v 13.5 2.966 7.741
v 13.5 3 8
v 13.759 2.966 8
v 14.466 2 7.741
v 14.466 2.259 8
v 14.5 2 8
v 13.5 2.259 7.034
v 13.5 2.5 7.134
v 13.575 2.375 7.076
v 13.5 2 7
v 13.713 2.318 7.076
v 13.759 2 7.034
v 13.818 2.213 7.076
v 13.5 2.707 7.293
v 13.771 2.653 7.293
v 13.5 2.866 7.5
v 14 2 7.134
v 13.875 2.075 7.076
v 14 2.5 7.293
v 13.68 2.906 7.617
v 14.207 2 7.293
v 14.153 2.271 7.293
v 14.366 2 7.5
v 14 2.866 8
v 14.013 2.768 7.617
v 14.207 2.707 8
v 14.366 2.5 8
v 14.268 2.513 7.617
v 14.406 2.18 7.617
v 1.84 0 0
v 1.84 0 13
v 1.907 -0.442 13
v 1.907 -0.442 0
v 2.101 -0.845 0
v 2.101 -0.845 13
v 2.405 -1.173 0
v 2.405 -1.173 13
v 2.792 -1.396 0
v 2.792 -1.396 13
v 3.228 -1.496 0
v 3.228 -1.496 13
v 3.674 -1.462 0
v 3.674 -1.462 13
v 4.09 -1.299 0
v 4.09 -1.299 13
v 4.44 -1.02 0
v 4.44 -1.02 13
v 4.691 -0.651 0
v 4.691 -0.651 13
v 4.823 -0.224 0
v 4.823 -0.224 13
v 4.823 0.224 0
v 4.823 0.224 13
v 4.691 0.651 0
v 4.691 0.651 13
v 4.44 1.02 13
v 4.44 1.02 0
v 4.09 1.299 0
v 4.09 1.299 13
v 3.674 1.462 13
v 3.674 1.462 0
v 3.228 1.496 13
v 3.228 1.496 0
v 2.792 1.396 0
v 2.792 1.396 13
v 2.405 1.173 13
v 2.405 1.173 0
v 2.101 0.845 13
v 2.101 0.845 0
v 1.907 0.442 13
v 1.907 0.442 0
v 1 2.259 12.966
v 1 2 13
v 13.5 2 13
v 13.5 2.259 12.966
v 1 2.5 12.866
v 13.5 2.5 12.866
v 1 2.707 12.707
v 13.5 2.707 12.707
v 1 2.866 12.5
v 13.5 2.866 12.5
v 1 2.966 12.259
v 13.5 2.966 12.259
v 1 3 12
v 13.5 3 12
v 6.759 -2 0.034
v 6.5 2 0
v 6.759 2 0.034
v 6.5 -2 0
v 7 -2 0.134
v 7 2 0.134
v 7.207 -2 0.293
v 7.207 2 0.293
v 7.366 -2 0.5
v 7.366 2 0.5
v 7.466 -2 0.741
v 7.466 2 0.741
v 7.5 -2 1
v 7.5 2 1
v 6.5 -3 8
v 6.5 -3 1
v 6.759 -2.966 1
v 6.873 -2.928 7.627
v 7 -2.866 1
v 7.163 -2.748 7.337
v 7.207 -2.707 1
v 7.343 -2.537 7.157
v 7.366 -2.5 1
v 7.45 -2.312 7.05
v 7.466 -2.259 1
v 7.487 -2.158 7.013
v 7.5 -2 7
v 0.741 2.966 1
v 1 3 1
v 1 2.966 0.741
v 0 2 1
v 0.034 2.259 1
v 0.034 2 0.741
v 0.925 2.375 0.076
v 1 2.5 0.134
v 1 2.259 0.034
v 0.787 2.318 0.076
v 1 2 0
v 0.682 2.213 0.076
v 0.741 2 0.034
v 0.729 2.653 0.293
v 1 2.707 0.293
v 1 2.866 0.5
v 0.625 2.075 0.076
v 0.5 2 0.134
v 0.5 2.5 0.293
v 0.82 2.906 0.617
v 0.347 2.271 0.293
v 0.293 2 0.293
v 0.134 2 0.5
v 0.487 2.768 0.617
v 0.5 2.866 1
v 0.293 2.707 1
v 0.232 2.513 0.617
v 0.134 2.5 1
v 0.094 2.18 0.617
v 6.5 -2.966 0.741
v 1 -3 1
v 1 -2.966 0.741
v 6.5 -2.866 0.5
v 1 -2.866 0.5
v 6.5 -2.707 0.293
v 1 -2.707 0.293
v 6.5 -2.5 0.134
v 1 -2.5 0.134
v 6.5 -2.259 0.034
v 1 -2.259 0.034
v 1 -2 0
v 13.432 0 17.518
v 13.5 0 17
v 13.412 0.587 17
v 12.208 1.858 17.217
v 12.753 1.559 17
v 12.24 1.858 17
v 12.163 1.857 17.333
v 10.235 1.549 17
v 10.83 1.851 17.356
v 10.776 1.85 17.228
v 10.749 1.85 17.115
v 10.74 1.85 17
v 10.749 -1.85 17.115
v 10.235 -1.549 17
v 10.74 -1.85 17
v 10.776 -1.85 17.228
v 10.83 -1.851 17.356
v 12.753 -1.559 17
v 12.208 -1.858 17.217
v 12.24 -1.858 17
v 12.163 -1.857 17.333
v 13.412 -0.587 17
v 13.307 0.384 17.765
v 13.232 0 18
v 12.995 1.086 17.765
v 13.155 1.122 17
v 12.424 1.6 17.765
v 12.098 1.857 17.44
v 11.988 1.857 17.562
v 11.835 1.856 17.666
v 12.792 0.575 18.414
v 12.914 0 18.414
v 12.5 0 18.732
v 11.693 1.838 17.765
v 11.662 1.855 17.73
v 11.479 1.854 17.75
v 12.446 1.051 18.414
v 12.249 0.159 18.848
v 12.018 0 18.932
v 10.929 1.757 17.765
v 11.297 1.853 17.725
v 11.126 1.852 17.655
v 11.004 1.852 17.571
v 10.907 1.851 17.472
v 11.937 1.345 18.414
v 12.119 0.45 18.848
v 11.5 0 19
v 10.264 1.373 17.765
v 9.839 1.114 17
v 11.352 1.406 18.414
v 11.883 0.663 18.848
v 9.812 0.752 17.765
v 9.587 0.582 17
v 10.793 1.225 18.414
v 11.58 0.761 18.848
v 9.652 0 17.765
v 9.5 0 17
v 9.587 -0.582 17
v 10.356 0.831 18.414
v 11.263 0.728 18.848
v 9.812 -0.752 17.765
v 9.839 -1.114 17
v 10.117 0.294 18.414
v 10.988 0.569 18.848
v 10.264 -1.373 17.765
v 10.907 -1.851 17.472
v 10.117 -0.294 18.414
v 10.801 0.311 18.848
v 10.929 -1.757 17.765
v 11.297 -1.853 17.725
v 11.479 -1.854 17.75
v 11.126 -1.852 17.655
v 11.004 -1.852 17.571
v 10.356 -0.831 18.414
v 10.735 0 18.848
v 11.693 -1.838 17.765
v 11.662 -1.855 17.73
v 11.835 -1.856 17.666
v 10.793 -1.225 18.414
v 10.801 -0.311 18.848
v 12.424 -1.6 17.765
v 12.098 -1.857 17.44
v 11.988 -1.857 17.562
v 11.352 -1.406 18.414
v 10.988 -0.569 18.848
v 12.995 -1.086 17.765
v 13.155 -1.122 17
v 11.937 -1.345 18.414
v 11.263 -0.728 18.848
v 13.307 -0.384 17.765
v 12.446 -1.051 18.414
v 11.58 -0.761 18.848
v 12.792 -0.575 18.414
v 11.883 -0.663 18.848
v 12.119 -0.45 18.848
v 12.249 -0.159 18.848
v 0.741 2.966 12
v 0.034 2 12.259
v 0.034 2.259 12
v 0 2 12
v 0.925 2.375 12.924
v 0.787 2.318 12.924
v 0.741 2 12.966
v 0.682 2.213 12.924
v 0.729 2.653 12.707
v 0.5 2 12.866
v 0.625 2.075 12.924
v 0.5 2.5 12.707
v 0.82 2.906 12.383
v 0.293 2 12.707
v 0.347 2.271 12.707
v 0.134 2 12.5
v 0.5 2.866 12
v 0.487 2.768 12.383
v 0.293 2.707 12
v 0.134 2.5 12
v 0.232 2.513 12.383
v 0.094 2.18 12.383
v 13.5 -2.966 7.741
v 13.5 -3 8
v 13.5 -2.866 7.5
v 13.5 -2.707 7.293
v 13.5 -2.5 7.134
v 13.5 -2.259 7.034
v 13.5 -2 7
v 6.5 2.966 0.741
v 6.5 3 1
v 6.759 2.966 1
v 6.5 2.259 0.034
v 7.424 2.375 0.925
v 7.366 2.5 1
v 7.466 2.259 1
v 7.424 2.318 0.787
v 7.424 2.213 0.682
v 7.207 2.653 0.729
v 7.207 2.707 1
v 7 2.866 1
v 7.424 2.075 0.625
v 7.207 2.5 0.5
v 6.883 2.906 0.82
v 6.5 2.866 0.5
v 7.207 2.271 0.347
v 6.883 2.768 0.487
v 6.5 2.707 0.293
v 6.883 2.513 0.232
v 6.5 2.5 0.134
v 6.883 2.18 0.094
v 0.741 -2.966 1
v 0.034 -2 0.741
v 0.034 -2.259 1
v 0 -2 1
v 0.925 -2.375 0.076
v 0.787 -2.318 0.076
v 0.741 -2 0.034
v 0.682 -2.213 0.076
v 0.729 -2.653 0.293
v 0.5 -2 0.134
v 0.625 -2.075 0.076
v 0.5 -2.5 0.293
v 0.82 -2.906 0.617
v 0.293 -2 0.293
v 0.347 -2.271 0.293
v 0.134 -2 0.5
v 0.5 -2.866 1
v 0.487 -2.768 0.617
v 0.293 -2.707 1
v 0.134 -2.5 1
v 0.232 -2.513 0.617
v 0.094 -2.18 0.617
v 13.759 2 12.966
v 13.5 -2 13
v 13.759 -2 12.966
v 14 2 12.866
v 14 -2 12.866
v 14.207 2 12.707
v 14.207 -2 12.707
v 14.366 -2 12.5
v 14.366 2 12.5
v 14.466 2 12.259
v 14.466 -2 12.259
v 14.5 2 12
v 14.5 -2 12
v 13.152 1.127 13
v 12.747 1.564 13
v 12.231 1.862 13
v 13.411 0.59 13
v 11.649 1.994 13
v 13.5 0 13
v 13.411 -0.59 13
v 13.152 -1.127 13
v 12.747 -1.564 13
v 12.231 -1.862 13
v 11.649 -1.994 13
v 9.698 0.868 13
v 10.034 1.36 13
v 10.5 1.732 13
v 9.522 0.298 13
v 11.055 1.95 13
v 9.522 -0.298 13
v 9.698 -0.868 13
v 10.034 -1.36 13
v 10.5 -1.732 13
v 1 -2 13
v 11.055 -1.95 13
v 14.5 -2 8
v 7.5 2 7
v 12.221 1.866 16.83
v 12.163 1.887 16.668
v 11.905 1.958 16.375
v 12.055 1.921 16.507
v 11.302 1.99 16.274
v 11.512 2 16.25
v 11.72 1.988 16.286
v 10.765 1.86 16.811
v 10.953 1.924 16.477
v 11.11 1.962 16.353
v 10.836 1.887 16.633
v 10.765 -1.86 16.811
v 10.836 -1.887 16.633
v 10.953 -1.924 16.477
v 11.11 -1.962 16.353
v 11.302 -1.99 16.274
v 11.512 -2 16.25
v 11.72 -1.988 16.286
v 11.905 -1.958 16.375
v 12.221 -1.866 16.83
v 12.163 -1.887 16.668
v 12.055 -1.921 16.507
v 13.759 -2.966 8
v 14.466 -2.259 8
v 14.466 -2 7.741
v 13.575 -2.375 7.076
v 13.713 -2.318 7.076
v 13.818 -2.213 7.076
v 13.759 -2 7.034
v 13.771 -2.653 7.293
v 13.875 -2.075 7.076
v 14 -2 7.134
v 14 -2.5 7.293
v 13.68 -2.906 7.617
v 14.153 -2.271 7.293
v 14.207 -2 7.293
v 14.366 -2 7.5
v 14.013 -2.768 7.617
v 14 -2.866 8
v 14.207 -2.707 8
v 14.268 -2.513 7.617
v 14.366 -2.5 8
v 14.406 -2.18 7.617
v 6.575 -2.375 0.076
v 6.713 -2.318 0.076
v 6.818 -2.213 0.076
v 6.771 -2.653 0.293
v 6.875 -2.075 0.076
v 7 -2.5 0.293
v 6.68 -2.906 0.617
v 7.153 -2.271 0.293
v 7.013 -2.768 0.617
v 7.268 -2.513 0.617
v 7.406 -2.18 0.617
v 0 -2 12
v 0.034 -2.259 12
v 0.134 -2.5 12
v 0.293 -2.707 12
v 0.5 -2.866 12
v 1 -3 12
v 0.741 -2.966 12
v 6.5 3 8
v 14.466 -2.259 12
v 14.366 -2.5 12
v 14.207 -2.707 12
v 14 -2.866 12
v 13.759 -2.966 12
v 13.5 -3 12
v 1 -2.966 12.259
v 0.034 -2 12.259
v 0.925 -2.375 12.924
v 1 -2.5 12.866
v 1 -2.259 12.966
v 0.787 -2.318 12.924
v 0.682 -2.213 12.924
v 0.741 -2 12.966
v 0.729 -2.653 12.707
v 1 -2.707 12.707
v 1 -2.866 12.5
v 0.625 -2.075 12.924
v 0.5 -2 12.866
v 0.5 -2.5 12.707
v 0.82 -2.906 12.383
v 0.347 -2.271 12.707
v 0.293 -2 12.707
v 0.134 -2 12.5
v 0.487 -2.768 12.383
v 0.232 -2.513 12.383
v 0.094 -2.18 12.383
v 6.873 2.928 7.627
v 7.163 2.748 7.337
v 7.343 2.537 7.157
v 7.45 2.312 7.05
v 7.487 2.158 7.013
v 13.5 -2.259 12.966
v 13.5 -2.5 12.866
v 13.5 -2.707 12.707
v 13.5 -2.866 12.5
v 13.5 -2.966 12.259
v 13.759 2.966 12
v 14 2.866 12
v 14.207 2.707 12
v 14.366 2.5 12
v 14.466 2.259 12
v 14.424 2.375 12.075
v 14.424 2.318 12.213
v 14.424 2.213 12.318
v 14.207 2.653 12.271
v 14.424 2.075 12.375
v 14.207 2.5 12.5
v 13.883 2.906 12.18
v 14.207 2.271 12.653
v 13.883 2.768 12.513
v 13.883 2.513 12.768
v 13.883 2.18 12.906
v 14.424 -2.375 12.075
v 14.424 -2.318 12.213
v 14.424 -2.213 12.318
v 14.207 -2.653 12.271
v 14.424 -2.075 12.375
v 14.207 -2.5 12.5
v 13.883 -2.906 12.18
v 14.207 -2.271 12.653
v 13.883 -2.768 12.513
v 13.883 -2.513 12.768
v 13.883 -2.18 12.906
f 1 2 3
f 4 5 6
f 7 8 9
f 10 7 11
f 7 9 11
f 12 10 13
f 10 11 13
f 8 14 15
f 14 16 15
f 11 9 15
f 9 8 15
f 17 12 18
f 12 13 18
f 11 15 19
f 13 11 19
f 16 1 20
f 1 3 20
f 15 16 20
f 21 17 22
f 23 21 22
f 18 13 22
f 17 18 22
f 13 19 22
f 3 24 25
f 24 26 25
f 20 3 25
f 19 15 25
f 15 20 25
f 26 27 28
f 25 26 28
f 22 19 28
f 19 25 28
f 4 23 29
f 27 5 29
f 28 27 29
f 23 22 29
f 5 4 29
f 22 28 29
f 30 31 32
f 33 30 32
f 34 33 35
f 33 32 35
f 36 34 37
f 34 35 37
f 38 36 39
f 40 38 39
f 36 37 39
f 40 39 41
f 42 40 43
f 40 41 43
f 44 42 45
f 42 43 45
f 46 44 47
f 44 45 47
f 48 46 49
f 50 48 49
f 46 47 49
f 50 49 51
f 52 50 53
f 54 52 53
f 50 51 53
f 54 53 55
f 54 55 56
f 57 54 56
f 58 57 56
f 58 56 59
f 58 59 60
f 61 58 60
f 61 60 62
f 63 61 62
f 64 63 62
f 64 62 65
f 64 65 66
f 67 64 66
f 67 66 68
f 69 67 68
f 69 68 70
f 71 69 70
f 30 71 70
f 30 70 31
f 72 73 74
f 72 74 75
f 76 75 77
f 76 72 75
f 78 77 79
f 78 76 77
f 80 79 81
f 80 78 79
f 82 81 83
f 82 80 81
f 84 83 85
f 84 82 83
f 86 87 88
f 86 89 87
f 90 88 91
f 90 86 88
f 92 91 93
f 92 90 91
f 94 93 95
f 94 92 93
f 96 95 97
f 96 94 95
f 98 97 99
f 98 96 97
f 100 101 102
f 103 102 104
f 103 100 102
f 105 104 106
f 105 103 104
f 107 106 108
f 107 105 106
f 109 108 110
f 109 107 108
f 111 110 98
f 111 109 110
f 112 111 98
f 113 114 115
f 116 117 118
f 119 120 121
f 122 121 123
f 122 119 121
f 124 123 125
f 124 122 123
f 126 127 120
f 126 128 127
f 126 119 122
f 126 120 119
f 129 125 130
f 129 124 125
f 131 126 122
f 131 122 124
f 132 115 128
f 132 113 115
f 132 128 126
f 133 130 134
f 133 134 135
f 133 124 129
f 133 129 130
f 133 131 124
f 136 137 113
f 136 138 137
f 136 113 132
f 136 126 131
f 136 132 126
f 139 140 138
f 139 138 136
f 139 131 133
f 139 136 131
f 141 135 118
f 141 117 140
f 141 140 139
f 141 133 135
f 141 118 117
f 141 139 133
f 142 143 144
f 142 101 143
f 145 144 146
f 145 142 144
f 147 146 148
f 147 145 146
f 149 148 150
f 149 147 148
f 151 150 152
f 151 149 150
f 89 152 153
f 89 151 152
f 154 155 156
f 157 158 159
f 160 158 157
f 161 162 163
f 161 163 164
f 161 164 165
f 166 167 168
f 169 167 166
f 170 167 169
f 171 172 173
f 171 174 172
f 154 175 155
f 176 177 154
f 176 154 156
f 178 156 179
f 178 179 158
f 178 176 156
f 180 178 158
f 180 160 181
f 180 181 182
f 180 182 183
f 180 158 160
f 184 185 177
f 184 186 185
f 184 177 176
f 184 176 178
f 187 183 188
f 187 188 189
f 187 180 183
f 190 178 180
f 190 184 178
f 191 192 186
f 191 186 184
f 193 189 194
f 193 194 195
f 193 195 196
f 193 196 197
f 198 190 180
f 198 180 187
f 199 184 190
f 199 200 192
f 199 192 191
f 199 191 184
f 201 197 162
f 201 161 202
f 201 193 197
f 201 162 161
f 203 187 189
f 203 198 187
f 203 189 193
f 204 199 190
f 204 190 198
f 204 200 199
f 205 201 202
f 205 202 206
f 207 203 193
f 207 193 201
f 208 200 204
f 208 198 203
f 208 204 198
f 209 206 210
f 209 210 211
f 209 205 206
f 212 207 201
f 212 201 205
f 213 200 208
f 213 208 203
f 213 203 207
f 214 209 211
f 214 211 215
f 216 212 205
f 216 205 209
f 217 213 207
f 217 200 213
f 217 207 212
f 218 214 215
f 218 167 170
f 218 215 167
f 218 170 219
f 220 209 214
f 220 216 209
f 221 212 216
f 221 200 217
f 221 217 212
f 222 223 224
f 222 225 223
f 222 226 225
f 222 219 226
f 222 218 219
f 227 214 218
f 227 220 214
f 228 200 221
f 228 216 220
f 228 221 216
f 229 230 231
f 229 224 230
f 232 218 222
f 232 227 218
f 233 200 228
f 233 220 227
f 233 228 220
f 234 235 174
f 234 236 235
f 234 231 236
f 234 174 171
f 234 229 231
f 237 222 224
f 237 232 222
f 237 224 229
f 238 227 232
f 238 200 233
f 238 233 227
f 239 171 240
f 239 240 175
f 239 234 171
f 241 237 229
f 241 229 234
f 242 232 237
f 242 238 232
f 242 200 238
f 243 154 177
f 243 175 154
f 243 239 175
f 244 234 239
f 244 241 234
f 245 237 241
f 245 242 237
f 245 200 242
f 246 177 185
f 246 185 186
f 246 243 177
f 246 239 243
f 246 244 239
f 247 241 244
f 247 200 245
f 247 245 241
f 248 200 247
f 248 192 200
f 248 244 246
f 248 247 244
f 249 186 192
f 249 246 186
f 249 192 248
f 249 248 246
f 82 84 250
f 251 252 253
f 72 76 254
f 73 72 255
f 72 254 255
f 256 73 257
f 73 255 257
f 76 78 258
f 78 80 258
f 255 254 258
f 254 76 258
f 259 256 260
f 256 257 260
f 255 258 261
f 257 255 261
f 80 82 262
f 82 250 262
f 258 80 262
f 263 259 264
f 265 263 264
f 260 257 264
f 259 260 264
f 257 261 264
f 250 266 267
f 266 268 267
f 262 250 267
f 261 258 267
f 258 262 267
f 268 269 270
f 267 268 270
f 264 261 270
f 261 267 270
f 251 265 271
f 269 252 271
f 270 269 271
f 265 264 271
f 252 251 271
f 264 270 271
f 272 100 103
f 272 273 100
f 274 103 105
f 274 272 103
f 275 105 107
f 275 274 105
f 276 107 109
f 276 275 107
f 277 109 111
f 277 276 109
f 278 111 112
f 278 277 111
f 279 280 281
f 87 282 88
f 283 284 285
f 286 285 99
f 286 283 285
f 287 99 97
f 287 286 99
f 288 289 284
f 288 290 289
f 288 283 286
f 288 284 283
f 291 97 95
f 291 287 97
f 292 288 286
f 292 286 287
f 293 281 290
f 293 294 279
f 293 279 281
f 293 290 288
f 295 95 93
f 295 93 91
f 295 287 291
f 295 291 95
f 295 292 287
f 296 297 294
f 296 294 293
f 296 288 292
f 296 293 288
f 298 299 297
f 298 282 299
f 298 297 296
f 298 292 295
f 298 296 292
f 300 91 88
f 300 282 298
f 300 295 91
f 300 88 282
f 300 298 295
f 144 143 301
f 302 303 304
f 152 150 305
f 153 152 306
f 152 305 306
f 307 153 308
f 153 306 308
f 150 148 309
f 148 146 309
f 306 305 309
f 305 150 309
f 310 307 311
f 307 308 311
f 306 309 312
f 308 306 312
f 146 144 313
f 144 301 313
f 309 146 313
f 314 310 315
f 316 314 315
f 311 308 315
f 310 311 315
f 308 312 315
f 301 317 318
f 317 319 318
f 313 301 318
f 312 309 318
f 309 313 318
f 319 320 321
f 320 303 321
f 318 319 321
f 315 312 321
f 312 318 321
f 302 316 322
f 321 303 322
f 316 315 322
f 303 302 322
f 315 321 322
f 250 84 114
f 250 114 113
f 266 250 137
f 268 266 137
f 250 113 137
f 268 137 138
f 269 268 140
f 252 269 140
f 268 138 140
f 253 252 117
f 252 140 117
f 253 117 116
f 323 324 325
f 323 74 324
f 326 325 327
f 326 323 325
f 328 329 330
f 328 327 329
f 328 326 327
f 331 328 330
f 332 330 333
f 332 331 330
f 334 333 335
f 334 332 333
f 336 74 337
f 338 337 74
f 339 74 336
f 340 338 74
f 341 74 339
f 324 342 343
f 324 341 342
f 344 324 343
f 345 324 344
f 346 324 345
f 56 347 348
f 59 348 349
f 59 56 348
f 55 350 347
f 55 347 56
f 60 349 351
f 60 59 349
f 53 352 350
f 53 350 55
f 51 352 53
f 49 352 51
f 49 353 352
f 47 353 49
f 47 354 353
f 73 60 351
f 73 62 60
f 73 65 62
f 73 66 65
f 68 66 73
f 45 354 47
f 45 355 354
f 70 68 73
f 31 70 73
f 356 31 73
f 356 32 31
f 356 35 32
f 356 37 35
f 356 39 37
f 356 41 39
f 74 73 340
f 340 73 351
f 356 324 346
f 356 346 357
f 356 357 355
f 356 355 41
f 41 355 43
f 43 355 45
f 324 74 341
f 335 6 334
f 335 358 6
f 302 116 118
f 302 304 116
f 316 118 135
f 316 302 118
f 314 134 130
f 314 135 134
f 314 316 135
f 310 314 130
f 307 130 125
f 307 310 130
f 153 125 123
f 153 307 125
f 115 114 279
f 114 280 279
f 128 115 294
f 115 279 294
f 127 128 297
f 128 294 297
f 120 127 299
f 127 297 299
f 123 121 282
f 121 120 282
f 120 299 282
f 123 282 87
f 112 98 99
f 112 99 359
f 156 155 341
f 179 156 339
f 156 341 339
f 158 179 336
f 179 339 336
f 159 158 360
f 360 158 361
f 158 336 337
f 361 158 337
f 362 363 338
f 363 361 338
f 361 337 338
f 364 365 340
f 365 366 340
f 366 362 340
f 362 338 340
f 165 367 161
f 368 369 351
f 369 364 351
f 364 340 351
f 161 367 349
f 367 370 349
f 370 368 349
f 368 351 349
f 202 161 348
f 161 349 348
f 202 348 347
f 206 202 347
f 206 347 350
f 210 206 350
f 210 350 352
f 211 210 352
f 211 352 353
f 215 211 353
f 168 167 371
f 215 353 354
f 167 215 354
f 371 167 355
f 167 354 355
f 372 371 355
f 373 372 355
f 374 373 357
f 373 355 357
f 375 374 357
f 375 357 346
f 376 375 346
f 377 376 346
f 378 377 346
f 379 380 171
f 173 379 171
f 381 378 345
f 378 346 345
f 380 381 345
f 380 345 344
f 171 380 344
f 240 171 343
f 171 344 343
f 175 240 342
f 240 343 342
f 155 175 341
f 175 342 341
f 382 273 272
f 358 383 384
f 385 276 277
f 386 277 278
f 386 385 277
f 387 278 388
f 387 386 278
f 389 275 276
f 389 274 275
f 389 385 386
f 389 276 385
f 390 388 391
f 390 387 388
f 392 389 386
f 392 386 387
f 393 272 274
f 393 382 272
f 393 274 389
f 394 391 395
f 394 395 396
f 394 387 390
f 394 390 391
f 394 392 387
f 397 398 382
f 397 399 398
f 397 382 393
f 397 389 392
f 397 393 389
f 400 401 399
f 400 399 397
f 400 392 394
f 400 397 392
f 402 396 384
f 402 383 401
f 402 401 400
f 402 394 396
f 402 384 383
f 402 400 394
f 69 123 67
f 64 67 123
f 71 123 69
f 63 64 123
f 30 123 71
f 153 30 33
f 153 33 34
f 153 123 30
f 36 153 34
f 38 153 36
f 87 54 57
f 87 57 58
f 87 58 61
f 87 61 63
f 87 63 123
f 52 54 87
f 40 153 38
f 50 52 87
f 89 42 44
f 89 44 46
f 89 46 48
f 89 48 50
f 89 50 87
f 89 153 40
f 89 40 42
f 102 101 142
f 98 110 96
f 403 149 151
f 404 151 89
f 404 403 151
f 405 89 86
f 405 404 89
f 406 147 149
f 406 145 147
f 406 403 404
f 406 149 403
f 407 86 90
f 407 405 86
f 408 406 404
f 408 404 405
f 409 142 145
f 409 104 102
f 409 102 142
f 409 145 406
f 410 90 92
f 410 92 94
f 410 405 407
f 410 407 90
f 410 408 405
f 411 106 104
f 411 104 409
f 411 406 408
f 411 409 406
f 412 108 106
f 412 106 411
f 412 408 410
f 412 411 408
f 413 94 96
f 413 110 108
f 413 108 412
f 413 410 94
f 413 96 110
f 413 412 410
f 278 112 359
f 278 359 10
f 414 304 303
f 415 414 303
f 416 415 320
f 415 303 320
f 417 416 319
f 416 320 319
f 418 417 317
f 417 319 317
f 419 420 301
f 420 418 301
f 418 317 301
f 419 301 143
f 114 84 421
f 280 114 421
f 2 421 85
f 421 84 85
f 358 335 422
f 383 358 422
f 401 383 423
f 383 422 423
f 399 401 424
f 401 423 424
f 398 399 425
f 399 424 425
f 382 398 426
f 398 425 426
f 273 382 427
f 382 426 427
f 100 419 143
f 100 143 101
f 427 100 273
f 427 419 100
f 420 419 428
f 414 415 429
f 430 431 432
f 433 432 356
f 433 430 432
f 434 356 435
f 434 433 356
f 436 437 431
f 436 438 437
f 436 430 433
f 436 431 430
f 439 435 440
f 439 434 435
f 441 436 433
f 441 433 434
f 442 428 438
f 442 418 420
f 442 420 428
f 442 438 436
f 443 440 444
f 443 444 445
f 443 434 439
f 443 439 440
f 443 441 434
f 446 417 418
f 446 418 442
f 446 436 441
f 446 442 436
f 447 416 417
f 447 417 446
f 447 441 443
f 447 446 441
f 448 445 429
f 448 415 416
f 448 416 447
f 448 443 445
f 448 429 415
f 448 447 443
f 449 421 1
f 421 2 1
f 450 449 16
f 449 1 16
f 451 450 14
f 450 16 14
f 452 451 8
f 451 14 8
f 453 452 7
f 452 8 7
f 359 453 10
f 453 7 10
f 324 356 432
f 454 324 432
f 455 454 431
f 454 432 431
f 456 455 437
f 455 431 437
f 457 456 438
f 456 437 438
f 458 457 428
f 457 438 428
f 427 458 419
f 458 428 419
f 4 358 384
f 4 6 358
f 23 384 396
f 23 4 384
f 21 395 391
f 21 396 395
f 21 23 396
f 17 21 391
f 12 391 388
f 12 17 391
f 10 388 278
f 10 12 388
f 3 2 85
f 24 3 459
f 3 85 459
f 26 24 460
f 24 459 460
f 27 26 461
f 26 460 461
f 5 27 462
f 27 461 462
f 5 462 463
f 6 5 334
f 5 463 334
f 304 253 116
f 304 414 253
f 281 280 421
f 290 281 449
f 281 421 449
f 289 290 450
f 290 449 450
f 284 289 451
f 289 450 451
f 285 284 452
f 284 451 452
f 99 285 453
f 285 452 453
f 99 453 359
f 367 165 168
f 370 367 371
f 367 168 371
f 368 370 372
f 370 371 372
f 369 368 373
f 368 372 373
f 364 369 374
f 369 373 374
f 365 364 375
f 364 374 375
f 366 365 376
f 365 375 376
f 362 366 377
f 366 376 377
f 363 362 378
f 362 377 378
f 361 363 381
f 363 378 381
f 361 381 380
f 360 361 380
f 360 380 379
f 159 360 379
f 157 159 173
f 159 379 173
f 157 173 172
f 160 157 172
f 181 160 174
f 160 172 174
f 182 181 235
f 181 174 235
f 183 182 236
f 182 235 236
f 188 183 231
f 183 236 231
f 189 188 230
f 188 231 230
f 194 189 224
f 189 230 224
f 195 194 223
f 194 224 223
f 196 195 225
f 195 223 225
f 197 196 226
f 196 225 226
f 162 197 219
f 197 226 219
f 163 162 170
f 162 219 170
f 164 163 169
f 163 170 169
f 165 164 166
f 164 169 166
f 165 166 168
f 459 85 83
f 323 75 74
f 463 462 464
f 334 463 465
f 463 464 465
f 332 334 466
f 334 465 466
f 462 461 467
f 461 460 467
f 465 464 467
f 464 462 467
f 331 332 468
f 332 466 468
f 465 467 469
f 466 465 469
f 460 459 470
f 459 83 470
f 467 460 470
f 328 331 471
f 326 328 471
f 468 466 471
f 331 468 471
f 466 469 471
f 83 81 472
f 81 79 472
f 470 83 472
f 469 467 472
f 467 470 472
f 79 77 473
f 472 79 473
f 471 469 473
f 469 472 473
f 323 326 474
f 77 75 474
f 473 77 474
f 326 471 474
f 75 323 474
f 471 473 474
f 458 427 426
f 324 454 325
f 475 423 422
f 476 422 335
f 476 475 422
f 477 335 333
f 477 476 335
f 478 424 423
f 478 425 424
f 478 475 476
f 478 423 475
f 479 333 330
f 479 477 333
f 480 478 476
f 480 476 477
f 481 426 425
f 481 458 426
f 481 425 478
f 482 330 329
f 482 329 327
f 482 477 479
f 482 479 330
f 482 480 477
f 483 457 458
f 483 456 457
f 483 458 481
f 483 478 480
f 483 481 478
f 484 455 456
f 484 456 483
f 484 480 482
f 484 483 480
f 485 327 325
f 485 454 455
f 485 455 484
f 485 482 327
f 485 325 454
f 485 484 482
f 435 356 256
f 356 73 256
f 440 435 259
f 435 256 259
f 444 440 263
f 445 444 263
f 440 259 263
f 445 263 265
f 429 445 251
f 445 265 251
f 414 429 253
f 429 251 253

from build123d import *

# Parameters (mm, degrees)
F1_DEPTH = 3
F2_R     = 2
F3_DEPTH = 6
F4_R     = 2
F6_DEPTH = 12.5
F8_D     = 3
F9_R     = 0.99999


# Not quite as in the source:
# - a fillet or chamfer is up to 0.001 mm smaller than in the source, because OpenCascade refuses the exact size


with BuildPart() as f1:
    # F0 (on Front) → F1 (new body, symmetric)
    with BuildSketch(Plane.XZ):
        Polygon((0, 13), (0, 0), (7.5, 0), (7.5, 7), (14.5, 7), (14.5, 13), align=None)
    extrude(amount=F1_DEPTH, both=True)

    # F2 (on face) → F3 (join)
    with BuildSketch(Plane.XY.offset(13)):
        with Locations((11.5, 0)):
            Circle(F2_R)
    extrude(amount=F3_DEPTH)

    # F4
    f4_edges = [f1.edges().sort_by_distance(p)[0] for p in [
        (9.5, 0, 19),
    ]]
    fillet(f4_edges, radius=F4_R)

    # F5 (on Front) → F6 (cut, symmetric)
    with BuildSketch(Plane.XZ):
        with BuildLine():
            Line((10.7404427901, 17), (12.2404427901, 17))
            ThreePointArc((12.2404427901, 17), (11.4904427901, 17.75), (10.7404427901, 17))
        make_face()
        with BuildLine():
            ThreePointArc((10.7404427901, 17), (11.4904427901, 16.25), (12.2404427901, 17))
            Line((12.2404427901, 17), (10.7404427901, 17))
        make_face()
    extrude(amount=F6_DEPTH, both=True, mode=Mode.SUBTRACT)

    # F8 (through all)
    with Locations(Plane(origin=(0, 0, 0), x_dir=(1, 0, 0), z_dir=(0, 0, -1))):
        with Locations((3.3399870154, 0)):
            Hole(F8_D / 2)

    # F9 (radius 1 in the source; OpenCascade refuses exactly that, so slightly less here)
    f9_edges = [f1.edges().sort_by_distance(p)[0] for p in [
        (0, 3, 6.5),
        (7.25, 3, 13),
        (14.5, 3, 10),
        (11, 3, 7),
        (3.75, 3, 0),
        (7.5, 3, 3.5),
        (0, -3, 6.5),
        (7.5, -3, 3.5),
        (3.75, -3, 0),
        (7.25, -3, 13),
        (14.5, -3, 10),
        (0, 0, 13),
        (0, 0, 0),
        (7.5, 0, 0),
        (11, -3, 7),
        (14.5, 0, 13),
        (14.5, 0, 7),
    ]]
    fillet(f9_edges, radius=F9_R)


solid = f1.part
